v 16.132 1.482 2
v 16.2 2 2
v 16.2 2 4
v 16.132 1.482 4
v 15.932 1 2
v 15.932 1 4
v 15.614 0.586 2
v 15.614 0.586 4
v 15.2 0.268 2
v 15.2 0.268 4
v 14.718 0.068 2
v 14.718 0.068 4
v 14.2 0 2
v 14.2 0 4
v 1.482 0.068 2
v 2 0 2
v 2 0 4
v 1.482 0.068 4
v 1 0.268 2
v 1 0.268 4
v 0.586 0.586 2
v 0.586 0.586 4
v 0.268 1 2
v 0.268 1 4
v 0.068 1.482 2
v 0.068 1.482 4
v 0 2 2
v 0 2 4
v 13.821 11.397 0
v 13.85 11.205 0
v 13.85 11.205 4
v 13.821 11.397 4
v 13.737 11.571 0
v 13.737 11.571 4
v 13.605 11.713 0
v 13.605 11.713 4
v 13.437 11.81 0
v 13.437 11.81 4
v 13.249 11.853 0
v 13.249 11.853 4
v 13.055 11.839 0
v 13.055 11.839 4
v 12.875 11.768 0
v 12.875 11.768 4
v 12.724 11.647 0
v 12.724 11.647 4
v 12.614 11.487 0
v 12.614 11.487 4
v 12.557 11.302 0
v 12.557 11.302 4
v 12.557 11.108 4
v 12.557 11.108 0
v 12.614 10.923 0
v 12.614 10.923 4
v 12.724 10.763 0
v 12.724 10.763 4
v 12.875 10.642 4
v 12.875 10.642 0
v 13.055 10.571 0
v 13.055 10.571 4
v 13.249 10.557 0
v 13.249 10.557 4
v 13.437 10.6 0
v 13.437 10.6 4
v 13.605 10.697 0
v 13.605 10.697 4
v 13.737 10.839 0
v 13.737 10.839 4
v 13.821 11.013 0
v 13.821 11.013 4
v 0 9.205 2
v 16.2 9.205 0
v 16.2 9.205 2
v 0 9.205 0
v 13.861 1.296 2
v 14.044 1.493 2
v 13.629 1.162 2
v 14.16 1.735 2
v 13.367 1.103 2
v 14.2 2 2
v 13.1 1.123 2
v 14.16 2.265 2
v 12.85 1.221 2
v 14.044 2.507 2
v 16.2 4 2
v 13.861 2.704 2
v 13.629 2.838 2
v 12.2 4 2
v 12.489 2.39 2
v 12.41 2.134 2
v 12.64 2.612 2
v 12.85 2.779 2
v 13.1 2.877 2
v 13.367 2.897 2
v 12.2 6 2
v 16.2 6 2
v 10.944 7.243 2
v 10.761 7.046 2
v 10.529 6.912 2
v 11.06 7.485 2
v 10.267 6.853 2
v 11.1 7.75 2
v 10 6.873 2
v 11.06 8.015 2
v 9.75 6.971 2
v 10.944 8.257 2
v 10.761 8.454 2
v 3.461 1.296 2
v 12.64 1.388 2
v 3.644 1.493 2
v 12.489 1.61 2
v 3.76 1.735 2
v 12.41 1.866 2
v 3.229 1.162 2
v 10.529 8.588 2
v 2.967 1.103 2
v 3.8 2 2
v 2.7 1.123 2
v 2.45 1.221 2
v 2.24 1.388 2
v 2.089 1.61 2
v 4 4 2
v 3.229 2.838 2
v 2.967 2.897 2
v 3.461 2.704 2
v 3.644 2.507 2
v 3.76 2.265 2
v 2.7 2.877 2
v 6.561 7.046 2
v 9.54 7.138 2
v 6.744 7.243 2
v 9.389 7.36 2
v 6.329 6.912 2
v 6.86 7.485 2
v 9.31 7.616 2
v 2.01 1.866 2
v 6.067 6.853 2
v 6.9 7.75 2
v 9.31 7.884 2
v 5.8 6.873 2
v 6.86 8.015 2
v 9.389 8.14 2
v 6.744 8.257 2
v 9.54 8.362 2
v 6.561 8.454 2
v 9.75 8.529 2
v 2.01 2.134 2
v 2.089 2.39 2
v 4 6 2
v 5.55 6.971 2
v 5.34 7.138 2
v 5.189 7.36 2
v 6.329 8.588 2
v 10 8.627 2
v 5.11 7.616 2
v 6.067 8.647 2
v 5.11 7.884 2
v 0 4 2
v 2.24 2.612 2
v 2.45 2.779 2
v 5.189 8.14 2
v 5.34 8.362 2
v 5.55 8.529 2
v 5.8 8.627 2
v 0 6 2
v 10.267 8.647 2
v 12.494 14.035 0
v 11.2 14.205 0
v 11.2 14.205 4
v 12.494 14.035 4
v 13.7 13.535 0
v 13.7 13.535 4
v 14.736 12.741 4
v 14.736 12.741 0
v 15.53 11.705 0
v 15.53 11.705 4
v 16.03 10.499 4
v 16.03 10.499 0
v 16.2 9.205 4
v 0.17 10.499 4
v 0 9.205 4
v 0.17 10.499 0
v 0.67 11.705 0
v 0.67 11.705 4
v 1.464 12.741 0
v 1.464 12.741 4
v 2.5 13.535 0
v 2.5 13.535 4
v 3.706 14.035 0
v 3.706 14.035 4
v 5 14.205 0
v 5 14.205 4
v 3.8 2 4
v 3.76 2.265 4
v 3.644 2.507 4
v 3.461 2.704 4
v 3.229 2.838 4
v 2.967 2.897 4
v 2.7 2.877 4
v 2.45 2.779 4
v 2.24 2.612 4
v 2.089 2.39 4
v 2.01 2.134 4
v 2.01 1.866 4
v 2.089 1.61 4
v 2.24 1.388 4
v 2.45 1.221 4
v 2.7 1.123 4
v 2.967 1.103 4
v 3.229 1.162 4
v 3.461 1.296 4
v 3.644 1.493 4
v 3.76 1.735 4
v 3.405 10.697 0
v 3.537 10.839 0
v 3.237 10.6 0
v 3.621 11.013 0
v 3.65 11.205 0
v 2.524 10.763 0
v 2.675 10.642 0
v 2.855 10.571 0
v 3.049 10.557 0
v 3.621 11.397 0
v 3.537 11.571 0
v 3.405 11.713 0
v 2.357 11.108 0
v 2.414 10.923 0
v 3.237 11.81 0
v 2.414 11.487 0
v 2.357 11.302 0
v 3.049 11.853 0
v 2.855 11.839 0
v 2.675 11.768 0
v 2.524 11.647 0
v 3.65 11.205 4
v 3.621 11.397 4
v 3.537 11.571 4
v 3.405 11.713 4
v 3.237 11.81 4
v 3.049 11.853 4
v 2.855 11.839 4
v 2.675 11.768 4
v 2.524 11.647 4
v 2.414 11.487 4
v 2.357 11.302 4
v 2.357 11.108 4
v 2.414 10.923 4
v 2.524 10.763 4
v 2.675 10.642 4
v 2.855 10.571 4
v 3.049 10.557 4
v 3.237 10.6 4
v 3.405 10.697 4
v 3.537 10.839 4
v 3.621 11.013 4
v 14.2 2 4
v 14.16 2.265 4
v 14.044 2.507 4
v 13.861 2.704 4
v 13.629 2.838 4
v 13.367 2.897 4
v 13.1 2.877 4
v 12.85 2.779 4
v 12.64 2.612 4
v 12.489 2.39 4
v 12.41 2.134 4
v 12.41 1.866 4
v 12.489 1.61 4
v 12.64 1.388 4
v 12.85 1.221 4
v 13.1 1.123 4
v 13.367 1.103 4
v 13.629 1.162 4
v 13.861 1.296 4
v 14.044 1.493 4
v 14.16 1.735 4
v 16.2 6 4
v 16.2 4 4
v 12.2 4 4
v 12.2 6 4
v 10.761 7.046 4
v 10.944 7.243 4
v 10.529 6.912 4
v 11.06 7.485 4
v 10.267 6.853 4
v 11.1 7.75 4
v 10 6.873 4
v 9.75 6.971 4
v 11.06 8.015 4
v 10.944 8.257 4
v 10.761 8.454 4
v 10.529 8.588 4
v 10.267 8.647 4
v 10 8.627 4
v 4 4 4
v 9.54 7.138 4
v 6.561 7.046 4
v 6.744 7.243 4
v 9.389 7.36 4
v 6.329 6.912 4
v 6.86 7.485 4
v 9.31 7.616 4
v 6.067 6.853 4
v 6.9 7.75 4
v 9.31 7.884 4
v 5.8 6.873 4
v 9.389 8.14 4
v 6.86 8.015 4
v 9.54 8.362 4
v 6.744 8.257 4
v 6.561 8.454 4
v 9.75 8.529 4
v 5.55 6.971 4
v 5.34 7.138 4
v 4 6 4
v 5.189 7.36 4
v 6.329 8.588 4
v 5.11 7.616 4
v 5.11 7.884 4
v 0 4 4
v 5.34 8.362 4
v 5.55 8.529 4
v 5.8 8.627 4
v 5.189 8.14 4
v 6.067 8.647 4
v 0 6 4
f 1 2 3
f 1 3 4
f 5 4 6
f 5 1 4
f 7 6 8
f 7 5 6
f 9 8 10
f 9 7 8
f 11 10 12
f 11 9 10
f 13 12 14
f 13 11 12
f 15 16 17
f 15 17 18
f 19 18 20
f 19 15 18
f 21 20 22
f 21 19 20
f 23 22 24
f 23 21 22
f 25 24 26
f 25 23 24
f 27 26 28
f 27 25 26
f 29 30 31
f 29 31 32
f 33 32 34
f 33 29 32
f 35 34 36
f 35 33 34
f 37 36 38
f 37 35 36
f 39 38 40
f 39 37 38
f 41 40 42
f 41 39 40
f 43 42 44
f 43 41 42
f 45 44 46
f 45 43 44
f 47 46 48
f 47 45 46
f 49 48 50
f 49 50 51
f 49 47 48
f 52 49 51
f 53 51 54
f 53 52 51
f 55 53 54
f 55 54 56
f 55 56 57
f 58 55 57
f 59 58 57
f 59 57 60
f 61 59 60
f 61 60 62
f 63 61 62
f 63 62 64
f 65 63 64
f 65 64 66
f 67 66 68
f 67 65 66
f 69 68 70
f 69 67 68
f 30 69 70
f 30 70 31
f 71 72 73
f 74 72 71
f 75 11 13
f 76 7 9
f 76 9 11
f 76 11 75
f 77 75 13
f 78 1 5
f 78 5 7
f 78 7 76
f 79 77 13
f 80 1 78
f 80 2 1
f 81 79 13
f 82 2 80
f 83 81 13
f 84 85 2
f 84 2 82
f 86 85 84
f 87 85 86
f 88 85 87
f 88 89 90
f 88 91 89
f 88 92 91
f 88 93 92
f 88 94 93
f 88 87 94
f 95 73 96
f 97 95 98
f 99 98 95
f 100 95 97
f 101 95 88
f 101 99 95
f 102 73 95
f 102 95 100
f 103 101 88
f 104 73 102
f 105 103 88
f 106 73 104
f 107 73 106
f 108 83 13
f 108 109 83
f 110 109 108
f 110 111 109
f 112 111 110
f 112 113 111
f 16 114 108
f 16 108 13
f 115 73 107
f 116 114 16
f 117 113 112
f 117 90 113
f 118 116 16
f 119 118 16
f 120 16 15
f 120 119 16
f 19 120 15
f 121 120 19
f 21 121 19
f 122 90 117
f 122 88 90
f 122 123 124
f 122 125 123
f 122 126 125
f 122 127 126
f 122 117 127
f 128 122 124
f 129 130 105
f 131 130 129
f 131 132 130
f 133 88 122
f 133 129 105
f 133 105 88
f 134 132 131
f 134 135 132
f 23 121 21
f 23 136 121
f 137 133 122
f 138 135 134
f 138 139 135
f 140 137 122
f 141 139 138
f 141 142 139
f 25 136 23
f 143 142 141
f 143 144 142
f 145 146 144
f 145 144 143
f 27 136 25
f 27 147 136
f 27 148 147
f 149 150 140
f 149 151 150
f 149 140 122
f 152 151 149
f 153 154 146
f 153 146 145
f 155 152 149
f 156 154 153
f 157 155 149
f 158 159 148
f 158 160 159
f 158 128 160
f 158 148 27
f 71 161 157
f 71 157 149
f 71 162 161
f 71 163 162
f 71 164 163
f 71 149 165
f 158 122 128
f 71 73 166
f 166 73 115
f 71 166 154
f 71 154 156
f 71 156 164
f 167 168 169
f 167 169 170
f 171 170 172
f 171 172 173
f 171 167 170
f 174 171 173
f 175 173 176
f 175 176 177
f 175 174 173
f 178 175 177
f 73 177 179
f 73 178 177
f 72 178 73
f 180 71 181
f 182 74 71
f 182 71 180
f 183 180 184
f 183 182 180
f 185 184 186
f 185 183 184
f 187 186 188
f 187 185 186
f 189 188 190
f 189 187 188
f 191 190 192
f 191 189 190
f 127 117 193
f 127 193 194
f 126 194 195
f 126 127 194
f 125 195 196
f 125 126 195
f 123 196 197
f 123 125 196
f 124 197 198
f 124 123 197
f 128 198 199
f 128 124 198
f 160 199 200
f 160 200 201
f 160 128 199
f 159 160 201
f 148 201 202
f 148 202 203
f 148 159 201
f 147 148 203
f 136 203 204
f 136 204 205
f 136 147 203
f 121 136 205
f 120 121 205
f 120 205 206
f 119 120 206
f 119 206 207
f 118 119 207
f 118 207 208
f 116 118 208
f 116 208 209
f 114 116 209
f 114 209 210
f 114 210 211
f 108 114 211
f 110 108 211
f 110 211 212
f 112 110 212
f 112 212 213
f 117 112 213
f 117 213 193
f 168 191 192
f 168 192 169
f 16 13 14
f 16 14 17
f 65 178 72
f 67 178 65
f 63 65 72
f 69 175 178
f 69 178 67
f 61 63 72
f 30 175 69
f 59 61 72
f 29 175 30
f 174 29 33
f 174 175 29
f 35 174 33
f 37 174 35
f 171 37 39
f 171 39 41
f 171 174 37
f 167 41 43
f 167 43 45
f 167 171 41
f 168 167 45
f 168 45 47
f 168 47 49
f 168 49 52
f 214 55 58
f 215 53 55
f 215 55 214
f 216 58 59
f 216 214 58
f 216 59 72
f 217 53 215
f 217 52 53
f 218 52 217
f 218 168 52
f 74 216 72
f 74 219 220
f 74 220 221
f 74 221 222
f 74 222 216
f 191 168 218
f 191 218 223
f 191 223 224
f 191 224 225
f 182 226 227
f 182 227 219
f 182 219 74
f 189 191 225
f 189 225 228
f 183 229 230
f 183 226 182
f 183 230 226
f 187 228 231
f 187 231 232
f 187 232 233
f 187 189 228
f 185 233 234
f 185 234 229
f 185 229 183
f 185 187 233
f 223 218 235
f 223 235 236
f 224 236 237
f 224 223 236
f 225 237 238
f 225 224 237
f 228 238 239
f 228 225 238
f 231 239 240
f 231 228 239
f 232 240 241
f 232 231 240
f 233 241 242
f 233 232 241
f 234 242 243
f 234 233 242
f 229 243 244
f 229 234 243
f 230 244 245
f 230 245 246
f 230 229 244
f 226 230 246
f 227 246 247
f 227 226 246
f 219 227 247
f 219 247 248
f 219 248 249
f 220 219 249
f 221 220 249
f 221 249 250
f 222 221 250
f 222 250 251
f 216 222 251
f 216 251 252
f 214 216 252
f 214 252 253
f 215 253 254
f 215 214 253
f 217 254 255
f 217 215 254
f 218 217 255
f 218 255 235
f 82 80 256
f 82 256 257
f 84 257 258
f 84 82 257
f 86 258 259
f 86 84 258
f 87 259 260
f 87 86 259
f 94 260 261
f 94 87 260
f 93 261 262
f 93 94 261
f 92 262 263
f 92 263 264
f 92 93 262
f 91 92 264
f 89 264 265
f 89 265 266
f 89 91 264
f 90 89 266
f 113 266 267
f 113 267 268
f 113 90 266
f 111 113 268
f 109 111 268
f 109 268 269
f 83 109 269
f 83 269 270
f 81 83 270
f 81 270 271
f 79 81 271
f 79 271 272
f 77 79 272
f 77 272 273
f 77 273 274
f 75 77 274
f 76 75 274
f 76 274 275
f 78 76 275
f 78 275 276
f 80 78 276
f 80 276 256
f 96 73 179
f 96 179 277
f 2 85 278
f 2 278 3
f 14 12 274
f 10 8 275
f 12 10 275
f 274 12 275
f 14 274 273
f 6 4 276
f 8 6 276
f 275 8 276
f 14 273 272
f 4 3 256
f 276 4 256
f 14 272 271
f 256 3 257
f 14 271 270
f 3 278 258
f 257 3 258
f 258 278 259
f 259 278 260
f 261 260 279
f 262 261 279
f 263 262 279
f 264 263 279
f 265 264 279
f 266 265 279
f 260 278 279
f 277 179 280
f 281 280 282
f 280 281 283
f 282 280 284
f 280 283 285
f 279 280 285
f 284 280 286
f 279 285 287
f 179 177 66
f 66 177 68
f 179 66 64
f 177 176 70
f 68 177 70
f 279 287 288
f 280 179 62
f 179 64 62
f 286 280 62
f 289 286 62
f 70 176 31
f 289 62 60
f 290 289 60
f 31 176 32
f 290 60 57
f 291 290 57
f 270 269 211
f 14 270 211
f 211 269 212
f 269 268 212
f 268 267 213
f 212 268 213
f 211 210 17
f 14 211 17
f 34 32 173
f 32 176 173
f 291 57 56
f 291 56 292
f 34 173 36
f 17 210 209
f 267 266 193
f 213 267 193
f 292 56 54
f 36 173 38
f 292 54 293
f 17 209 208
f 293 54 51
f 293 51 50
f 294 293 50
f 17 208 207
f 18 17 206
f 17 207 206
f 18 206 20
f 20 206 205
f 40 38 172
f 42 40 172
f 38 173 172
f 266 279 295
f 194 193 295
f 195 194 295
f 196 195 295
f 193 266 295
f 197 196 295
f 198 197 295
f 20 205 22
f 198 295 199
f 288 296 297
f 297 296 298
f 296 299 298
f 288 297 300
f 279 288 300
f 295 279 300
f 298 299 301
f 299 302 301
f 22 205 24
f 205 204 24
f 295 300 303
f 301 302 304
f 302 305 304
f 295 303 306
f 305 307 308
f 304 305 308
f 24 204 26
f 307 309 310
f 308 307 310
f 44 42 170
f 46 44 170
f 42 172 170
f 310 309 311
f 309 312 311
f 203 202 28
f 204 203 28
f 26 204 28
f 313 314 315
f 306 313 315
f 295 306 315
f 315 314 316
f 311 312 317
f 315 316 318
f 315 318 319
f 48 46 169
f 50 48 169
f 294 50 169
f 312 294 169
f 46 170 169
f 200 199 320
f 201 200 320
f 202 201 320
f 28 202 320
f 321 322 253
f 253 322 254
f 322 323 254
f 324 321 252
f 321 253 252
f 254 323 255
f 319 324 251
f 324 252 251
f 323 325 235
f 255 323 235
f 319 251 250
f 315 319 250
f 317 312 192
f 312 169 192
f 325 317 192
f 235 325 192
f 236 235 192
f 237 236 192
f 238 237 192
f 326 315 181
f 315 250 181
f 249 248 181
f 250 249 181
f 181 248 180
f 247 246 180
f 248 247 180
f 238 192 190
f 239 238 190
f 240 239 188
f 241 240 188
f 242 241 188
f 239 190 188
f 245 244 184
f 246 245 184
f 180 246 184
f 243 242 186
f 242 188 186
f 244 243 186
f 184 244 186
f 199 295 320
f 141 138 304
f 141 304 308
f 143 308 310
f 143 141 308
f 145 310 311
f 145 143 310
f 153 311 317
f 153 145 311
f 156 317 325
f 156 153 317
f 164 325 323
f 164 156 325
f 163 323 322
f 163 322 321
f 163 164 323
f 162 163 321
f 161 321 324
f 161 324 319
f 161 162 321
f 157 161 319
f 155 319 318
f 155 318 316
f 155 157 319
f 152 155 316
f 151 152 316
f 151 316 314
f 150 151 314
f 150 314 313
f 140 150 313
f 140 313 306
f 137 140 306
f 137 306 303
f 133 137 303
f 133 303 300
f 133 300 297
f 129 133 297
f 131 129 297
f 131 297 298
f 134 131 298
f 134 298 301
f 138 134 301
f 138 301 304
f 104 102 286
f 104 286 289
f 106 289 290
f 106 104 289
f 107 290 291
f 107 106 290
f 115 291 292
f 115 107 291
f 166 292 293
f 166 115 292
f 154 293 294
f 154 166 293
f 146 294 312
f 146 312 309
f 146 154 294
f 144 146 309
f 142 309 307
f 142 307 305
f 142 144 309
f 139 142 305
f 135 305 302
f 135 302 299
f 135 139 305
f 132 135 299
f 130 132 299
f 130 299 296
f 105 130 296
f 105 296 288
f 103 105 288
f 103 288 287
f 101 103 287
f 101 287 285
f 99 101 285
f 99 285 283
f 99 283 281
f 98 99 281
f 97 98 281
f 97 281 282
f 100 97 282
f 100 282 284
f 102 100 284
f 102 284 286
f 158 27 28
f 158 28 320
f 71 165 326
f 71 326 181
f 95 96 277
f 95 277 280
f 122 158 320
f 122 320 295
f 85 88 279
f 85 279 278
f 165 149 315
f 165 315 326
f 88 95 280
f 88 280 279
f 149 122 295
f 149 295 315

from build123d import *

# Parameters (mm, degrees)
SKETCH1_R           = 0.9
SKETCH1_R_2         = 0.65
BOSS_EXTRUDE1_DEPTH = 4
SKETCH2_W           = 16.2
SKETCH2_H           = 9.205
CUT_EXTRUDE1_DEPTH  = 2


with BuildPart() as part:
    # Sketch1 → Boss-Extrude1 (new body)
    with BuildSketch(Plane.XY):
        with BuildLine():
            Line((12.2, 4), (16.2, 4))
            Line((16.2, 4), (16.2, 2))
            ThreePointArc((16.2, 2), (15.614213562, 0.585786438), (14.2, 0))
            Line((14.2, 0), (2, 0))
            ThreePointArc((2, 0), (0.585786438, 0.585786438), (0, 2))
            Line((0, 2), (0, 4))
            Line((0, 4), (4, 4))
            Line((4, 4), (4, 6))
            Line((4, 6), (0, 6))
            Line((0, 6), (0, 9.205))
            ThreePointArc((0, 9.205), (1.464466094, 12.740533906), (5, 14.205))
            Line((5, 14.205), (11.2, 14.205))
            ThreePointArc((11.2, 14.205), (14.735533906, 12.740533906), (16.2, 9.205))
            Line((16.2, 9.205), (16.2, 6))
            Line((16.2, 6), (12.2, 6))
            Line((12.2, 6), (12.2, 4))
        make_face()
        with Locations((13.3, 2)):
            Circle(SKETCH1_R, mode=Mode.SUBTRACT)
        with Locations((13.2, 11.205)):
            Circle(SKETCH1_R_2, mode=Mode.SUBTRACT)
        with Locations((10.2, 7.75)):
            Circle(SKETCH1_R, mode=Mode.SUBTRACT)
        with Locations((6, 7.75)):
            Circle(SKETCH1_R, mode=Mode.SUBTRACT)
        with Locations((3, 11.205)):
            Circle(SKETCH1_R_2, mode=Mode.SUBTRACT)
        with Locations((2.9, 2)):
            Circle(SKETCH1_R, mode=Mode.SUBTRACT)
    extrude(amount=BOSS_EXTRUDE1_DEPTH)

    # Sketch2 → Cut-Extrude1 (cut)
    with BuildSketch(Plane(origin=(0, 0, 0), x_dir=(-1, 0, 0), z_dir=(0, 0, -1))):
        with Locations((-8.1, 4.6025)):
            Rectangle(SKETCH2_W, SKETCH2_H)
    extrude(amount=-CUT_EXTRUDE1_DEPTH, mode=Mode.SUBTRACT)


solid = part.part
